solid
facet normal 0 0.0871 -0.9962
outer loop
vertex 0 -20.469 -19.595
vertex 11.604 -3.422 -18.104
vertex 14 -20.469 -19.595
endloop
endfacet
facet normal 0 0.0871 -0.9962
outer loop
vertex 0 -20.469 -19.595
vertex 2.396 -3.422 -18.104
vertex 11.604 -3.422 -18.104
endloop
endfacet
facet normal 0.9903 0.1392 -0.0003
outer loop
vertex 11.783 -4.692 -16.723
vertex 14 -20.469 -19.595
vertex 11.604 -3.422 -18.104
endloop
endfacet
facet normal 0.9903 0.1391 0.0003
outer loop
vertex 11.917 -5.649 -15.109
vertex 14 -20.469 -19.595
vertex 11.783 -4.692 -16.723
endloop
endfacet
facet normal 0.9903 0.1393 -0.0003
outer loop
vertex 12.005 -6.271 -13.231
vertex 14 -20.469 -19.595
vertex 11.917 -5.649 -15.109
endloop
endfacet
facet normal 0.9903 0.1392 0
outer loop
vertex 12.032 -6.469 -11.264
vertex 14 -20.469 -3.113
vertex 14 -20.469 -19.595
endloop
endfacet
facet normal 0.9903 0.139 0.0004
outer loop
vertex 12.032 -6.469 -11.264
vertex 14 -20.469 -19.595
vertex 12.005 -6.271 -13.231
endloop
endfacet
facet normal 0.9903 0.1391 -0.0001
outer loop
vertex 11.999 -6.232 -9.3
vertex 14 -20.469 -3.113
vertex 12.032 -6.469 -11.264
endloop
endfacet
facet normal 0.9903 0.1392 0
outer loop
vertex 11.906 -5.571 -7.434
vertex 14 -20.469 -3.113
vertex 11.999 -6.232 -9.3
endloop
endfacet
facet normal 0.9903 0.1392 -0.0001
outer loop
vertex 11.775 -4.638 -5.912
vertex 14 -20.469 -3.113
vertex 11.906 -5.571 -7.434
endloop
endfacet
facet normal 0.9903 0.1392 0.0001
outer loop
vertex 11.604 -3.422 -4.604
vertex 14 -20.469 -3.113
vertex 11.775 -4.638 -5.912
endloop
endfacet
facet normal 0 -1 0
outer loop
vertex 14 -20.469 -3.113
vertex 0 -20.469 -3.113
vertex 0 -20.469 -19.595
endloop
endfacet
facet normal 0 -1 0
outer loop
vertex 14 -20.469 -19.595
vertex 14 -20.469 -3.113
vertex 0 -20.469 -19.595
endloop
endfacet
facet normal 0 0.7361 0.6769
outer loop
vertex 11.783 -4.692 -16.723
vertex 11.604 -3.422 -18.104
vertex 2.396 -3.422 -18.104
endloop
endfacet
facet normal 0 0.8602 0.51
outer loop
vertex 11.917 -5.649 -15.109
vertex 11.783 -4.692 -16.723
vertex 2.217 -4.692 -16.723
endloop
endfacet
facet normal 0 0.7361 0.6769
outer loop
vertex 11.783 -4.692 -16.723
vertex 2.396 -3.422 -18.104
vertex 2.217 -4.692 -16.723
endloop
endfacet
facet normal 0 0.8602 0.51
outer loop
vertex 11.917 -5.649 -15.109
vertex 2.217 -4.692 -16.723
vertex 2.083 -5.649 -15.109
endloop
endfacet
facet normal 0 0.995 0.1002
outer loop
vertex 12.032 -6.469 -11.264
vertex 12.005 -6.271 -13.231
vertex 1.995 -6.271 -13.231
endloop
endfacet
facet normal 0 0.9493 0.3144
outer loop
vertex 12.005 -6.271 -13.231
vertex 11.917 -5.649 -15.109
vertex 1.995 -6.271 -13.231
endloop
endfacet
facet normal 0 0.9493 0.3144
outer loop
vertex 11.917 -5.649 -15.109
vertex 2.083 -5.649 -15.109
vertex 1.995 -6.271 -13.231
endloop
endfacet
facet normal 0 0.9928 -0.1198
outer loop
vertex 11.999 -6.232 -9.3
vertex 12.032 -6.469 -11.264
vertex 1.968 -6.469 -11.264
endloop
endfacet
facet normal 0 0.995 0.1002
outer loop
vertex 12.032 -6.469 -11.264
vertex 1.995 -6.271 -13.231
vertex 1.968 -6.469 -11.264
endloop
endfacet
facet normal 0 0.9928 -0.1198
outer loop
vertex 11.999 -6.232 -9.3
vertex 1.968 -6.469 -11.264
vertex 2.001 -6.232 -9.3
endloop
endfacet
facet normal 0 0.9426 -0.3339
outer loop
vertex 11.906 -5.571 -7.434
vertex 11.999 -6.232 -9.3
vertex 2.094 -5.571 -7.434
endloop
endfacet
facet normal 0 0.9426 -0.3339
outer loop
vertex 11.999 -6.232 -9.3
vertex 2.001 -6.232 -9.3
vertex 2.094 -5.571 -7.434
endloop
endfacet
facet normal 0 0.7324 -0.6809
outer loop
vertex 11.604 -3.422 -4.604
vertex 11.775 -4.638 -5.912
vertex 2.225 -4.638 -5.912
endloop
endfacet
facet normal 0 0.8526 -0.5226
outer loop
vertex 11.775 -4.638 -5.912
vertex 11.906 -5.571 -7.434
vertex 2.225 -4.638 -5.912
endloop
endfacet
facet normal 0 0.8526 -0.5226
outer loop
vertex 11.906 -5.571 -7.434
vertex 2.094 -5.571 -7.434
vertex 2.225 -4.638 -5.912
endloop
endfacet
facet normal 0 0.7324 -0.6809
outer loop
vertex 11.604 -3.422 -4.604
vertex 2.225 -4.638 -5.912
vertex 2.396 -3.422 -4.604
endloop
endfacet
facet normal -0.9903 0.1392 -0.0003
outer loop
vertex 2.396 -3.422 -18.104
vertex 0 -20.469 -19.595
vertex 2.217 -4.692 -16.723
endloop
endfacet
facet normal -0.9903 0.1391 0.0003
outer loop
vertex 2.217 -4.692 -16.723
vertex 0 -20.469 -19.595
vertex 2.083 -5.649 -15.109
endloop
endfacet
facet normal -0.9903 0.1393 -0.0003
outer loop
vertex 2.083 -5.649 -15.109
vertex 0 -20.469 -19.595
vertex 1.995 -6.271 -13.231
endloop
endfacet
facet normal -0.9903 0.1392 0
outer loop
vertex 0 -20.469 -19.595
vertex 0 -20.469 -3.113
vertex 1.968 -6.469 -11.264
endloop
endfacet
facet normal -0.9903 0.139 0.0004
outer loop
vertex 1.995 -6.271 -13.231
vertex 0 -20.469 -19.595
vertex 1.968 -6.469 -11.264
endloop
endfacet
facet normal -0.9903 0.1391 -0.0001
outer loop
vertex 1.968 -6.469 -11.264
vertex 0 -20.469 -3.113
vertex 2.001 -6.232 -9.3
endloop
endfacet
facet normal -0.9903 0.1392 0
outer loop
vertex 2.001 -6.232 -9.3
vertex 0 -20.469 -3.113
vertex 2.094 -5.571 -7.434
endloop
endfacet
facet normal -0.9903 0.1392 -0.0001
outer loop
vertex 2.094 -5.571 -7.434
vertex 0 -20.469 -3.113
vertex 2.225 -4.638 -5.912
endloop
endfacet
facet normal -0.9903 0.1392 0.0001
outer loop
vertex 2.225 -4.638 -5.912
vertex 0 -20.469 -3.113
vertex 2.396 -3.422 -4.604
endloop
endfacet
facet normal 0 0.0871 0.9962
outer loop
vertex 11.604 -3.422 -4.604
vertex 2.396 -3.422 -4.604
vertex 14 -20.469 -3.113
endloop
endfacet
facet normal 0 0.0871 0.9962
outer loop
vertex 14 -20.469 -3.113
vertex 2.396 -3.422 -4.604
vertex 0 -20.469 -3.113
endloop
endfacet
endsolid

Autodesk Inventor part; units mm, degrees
ref_plane "YZ Plane" through (0, 0, 0) normal (1, 0, 0) x (0, 1, 0)
ref_plane "XZ Plane" through (0, 0, 0) normal (0, 1, 0) x (-1, 0, 0)
ref_plane "XY Plane" through (0, 0, 0) normal (0, 0, 1) x (1, 0, 0)
sketch "Sketch1" plane through (0, 0, 0) normal (1, 0, 0) x (0, 1, 0)
  arc A0 (-3.4223, -4.604) -> (-3.4223, -18.104) centre (2.5306, -11.354) ccw
  line L0 (-20.4694, -3.1126) -> (-20.4694, -19.5954)
  line L1 (-3.4223, -18.104) -> (-20.4694, -19.5954)
  line L2 (-3.4223, -4.604) -> (-20.4694, -3.1126)
  point P0 (0, 0)
  dimension "d5" = 23
  dimension "d21" = 9
  dimension "d28" = 85
extrude "Extrusion1" add sketch "Sketch1" along normal blind 14
draft "FaceDraft3" angle 8 pull direction (0, 1, 0) faces at (0, -15.7807, -10.9914) fixed edges at (0, -20.4694, -11.354)
draft "FaceDraft4" angle 8 pull direction (0, 1, 0) faces at (14, -15.7807, -10.9914) fixed edges at (14, -20.4694, -11.354)
properties part number "BaseGarra"
